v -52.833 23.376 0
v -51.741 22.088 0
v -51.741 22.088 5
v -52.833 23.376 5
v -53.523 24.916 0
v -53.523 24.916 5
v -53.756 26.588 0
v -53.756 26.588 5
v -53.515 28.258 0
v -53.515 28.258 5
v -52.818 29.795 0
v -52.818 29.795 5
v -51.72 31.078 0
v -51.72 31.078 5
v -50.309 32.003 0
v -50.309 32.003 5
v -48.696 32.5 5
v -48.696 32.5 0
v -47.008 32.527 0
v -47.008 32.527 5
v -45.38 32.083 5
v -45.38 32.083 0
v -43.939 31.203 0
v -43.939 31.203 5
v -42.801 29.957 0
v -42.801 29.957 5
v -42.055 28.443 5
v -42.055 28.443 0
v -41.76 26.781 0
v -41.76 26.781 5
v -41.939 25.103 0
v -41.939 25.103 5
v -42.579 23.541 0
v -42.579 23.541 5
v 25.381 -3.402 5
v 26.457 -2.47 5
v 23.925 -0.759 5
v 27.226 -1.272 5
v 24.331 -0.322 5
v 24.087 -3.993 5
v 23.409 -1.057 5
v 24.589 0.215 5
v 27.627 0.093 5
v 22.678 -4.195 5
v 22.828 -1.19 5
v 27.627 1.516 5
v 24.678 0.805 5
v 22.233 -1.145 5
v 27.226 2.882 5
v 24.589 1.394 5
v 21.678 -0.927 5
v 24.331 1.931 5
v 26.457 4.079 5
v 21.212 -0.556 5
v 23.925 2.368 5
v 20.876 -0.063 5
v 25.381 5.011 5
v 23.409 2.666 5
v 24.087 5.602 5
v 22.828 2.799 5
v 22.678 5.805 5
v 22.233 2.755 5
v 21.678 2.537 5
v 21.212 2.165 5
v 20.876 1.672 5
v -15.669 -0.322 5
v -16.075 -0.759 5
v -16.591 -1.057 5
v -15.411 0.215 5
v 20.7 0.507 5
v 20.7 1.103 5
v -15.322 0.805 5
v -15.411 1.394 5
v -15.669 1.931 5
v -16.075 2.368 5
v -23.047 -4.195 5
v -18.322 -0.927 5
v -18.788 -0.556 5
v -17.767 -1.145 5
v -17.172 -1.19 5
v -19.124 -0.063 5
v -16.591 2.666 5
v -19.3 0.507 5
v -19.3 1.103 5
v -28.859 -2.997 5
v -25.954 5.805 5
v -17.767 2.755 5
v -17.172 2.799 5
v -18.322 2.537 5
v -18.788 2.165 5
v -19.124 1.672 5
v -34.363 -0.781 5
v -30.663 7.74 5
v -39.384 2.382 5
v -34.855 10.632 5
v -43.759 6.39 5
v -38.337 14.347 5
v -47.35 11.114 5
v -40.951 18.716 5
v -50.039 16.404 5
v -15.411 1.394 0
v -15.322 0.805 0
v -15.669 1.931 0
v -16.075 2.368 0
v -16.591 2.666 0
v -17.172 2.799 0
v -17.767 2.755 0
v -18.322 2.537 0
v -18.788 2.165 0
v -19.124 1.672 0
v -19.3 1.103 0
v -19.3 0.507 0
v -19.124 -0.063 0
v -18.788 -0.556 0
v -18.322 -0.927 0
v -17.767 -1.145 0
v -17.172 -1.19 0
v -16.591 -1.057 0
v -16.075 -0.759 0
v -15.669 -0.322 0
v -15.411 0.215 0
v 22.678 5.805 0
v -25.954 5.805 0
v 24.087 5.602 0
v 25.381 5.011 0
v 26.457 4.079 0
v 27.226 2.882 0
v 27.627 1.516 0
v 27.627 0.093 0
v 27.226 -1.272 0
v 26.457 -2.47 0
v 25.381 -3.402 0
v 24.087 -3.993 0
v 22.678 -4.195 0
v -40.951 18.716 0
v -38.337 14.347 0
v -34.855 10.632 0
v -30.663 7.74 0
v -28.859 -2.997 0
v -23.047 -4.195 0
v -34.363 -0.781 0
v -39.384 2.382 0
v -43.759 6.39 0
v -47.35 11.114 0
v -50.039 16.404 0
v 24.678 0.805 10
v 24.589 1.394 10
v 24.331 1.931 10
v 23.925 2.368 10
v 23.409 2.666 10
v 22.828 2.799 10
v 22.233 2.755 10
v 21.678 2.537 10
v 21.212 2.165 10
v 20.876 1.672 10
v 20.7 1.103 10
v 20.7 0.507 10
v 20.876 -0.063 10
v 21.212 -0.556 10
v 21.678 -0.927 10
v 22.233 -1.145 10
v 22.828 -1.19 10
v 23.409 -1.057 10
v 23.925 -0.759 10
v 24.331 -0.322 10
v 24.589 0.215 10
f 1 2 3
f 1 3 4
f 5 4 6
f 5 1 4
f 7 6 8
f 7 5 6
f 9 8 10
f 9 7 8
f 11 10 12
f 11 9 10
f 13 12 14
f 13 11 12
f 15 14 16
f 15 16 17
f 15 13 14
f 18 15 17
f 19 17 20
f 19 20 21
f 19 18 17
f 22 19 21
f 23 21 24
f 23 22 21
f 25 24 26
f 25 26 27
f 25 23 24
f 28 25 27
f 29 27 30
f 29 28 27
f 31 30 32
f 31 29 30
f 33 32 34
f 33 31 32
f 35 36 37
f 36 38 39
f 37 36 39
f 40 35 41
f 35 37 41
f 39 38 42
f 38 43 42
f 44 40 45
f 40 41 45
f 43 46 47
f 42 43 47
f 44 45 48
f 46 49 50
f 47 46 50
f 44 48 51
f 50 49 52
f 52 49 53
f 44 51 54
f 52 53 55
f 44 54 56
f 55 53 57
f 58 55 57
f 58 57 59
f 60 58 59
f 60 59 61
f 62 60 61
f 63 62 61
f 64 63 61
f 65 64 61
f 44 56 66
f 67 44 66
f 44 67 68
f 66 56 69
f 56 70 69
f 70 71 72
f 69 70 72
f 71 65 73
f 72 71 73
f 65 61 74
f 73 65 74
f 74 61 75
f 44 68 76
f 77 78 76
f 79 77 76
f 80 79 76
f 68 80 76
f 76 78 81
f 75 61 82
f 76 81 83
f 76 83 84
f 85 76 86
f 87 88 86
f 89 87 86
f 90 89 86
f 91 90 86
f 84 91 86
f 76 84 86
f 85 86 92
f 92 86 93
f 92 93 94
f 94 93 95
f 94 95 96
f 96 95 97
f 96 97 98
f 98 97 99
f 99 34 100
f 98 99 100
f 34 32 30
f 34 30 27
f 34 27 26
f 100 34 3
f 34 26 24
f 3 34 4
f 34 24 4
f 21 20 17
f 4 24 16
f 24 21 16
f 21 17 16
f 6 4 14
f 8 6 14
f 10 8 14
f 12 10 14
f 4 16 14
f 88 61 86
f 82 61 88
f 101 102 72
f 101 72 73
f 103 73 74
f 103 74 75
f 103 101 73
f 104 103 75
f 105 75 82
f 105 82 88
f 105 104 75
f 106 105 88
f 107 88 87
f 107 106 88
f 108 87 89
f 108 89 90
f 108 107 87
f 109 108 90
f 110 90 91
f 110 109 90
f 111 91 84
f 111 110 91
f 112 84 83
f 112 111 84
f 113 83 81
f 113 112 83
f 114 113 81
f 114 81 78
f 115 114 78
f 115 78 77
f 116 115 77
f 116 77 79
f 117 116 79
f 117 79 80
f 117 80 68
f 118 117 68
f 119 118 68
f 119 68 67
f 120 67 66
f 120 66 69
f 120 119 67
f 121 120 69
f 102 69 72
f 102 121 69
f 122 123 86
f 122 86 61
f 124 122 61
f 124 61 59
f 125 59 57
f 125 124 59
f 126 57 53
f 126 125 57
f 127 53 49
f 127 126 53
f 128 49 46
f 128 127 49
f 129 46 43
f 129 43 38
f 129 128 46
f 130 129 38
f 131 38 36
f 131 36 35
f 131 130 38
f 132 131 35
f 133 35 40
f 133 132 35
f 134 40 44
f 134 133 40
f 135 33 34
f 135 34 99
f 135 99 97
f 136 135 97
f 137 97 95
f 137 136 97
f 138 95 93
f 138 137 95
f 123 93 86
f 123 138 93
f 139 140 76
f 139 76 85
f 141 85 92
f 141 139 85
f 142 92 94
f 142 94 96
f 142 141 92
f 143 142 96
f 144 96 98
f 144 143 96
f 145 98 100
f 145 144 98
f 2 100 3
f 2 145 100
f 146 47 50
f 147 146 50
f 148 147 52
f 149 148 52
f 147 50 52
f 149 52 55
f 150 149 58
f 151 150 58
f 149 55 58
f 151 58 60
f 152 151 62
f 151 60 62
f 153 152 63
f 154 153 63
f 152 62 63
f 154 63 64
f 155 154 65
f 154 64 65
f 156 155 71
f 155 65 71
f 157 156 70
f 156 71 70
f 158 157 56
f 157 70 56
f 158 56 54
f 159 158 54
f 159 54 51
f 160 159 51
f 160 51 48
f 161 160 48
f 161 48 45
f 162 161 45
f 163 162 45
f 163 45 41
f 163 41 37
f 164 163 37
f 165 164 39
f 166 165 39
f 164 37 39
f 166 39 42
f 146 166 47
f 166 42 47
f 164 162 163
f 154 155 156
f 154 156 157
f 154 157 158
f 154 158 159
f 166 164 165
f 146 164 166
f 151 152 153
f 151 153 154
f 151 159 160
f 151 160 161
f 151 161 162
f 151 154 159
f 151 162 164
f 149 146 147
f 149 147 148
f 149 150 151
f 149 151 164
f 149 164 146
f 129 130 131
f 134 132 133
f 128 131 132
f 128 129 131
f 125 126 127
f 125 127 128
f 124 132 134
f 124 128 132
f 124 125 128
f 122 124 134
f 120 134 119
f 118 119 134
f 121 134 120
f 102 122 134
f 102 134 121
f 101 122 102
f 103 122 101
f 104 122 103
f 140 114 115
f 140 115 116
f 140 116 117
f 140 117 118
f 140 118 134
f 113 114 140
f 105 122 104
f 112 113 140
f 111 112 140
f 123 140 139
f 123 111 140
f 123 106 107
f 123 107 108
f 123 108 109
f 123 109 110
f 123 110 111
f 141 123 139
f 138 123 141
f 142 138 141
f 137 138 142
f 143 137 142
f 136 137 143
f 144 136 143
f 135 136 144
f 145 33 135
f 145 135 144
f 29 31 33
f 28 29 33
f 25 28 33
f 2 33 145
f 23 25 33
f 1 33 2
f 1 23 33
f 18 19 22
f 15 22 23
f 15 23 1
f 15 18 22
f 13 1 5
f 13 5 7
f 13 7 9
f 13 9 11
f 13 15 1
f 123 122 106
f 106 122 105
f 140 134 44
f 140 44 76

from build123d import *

# Parameters (mm, degrees)
CROQUIS1_R              = 2
SALIENTE_EXTRUIR1_DEPTH = 5
CROQUIS2_R              = 2
SALIENTE_EXTRUIR2_DEPTH = 5


with BuildPart() as part:
    # Croquis1 → Saliente-Extruir1 (new body)
    with BuildSketch(Plane.XY):
        with BuildLine():
            Line((-25.953664325, 5.804713338), (22.678050908, 5.804713338))
            ThreePointArc((22.678050908, 5.804713338), (27.678050908, 0.804713338), (22.678050908, -4.195286662))
            Line((22.678050908, -4.195286662), (-23.047151147, -4.195286662))
            ThreePointArc((-23.047151147, -4.195286662), (-41.661617991, 4.287687085), (-51.741257509, 22.088251307))
            ThreePointArc((-51.741257509, 22.088251307), (-48.695784379, 32.499543684), (-42.578743977, 23.541210565))
            ThreePointArc((-42.578743977, 23.541210565), (-36.695300038, 12.396079877), (-25.953664325, 5.804713338))
        make_face()
        with Locations((-17.321949092, 0.804713338)):
            Circle(CROQUIS1_R, mode=Mode.SUBTRACT)
    extrude(amount=SALIENTE_EXTRUIR1_DEPTH)

    # Croquis2 → Saliente-Extruir2 (add)
    with BuildSketch(Plane.XY.offset(5)):
        with Locations((22.678050908, 0.804713338)):
            Circle(CROQUIS2_R)
    extrude(amount=SALIENTE_EXTRUIR2_DEPTH)


solid = part.part
